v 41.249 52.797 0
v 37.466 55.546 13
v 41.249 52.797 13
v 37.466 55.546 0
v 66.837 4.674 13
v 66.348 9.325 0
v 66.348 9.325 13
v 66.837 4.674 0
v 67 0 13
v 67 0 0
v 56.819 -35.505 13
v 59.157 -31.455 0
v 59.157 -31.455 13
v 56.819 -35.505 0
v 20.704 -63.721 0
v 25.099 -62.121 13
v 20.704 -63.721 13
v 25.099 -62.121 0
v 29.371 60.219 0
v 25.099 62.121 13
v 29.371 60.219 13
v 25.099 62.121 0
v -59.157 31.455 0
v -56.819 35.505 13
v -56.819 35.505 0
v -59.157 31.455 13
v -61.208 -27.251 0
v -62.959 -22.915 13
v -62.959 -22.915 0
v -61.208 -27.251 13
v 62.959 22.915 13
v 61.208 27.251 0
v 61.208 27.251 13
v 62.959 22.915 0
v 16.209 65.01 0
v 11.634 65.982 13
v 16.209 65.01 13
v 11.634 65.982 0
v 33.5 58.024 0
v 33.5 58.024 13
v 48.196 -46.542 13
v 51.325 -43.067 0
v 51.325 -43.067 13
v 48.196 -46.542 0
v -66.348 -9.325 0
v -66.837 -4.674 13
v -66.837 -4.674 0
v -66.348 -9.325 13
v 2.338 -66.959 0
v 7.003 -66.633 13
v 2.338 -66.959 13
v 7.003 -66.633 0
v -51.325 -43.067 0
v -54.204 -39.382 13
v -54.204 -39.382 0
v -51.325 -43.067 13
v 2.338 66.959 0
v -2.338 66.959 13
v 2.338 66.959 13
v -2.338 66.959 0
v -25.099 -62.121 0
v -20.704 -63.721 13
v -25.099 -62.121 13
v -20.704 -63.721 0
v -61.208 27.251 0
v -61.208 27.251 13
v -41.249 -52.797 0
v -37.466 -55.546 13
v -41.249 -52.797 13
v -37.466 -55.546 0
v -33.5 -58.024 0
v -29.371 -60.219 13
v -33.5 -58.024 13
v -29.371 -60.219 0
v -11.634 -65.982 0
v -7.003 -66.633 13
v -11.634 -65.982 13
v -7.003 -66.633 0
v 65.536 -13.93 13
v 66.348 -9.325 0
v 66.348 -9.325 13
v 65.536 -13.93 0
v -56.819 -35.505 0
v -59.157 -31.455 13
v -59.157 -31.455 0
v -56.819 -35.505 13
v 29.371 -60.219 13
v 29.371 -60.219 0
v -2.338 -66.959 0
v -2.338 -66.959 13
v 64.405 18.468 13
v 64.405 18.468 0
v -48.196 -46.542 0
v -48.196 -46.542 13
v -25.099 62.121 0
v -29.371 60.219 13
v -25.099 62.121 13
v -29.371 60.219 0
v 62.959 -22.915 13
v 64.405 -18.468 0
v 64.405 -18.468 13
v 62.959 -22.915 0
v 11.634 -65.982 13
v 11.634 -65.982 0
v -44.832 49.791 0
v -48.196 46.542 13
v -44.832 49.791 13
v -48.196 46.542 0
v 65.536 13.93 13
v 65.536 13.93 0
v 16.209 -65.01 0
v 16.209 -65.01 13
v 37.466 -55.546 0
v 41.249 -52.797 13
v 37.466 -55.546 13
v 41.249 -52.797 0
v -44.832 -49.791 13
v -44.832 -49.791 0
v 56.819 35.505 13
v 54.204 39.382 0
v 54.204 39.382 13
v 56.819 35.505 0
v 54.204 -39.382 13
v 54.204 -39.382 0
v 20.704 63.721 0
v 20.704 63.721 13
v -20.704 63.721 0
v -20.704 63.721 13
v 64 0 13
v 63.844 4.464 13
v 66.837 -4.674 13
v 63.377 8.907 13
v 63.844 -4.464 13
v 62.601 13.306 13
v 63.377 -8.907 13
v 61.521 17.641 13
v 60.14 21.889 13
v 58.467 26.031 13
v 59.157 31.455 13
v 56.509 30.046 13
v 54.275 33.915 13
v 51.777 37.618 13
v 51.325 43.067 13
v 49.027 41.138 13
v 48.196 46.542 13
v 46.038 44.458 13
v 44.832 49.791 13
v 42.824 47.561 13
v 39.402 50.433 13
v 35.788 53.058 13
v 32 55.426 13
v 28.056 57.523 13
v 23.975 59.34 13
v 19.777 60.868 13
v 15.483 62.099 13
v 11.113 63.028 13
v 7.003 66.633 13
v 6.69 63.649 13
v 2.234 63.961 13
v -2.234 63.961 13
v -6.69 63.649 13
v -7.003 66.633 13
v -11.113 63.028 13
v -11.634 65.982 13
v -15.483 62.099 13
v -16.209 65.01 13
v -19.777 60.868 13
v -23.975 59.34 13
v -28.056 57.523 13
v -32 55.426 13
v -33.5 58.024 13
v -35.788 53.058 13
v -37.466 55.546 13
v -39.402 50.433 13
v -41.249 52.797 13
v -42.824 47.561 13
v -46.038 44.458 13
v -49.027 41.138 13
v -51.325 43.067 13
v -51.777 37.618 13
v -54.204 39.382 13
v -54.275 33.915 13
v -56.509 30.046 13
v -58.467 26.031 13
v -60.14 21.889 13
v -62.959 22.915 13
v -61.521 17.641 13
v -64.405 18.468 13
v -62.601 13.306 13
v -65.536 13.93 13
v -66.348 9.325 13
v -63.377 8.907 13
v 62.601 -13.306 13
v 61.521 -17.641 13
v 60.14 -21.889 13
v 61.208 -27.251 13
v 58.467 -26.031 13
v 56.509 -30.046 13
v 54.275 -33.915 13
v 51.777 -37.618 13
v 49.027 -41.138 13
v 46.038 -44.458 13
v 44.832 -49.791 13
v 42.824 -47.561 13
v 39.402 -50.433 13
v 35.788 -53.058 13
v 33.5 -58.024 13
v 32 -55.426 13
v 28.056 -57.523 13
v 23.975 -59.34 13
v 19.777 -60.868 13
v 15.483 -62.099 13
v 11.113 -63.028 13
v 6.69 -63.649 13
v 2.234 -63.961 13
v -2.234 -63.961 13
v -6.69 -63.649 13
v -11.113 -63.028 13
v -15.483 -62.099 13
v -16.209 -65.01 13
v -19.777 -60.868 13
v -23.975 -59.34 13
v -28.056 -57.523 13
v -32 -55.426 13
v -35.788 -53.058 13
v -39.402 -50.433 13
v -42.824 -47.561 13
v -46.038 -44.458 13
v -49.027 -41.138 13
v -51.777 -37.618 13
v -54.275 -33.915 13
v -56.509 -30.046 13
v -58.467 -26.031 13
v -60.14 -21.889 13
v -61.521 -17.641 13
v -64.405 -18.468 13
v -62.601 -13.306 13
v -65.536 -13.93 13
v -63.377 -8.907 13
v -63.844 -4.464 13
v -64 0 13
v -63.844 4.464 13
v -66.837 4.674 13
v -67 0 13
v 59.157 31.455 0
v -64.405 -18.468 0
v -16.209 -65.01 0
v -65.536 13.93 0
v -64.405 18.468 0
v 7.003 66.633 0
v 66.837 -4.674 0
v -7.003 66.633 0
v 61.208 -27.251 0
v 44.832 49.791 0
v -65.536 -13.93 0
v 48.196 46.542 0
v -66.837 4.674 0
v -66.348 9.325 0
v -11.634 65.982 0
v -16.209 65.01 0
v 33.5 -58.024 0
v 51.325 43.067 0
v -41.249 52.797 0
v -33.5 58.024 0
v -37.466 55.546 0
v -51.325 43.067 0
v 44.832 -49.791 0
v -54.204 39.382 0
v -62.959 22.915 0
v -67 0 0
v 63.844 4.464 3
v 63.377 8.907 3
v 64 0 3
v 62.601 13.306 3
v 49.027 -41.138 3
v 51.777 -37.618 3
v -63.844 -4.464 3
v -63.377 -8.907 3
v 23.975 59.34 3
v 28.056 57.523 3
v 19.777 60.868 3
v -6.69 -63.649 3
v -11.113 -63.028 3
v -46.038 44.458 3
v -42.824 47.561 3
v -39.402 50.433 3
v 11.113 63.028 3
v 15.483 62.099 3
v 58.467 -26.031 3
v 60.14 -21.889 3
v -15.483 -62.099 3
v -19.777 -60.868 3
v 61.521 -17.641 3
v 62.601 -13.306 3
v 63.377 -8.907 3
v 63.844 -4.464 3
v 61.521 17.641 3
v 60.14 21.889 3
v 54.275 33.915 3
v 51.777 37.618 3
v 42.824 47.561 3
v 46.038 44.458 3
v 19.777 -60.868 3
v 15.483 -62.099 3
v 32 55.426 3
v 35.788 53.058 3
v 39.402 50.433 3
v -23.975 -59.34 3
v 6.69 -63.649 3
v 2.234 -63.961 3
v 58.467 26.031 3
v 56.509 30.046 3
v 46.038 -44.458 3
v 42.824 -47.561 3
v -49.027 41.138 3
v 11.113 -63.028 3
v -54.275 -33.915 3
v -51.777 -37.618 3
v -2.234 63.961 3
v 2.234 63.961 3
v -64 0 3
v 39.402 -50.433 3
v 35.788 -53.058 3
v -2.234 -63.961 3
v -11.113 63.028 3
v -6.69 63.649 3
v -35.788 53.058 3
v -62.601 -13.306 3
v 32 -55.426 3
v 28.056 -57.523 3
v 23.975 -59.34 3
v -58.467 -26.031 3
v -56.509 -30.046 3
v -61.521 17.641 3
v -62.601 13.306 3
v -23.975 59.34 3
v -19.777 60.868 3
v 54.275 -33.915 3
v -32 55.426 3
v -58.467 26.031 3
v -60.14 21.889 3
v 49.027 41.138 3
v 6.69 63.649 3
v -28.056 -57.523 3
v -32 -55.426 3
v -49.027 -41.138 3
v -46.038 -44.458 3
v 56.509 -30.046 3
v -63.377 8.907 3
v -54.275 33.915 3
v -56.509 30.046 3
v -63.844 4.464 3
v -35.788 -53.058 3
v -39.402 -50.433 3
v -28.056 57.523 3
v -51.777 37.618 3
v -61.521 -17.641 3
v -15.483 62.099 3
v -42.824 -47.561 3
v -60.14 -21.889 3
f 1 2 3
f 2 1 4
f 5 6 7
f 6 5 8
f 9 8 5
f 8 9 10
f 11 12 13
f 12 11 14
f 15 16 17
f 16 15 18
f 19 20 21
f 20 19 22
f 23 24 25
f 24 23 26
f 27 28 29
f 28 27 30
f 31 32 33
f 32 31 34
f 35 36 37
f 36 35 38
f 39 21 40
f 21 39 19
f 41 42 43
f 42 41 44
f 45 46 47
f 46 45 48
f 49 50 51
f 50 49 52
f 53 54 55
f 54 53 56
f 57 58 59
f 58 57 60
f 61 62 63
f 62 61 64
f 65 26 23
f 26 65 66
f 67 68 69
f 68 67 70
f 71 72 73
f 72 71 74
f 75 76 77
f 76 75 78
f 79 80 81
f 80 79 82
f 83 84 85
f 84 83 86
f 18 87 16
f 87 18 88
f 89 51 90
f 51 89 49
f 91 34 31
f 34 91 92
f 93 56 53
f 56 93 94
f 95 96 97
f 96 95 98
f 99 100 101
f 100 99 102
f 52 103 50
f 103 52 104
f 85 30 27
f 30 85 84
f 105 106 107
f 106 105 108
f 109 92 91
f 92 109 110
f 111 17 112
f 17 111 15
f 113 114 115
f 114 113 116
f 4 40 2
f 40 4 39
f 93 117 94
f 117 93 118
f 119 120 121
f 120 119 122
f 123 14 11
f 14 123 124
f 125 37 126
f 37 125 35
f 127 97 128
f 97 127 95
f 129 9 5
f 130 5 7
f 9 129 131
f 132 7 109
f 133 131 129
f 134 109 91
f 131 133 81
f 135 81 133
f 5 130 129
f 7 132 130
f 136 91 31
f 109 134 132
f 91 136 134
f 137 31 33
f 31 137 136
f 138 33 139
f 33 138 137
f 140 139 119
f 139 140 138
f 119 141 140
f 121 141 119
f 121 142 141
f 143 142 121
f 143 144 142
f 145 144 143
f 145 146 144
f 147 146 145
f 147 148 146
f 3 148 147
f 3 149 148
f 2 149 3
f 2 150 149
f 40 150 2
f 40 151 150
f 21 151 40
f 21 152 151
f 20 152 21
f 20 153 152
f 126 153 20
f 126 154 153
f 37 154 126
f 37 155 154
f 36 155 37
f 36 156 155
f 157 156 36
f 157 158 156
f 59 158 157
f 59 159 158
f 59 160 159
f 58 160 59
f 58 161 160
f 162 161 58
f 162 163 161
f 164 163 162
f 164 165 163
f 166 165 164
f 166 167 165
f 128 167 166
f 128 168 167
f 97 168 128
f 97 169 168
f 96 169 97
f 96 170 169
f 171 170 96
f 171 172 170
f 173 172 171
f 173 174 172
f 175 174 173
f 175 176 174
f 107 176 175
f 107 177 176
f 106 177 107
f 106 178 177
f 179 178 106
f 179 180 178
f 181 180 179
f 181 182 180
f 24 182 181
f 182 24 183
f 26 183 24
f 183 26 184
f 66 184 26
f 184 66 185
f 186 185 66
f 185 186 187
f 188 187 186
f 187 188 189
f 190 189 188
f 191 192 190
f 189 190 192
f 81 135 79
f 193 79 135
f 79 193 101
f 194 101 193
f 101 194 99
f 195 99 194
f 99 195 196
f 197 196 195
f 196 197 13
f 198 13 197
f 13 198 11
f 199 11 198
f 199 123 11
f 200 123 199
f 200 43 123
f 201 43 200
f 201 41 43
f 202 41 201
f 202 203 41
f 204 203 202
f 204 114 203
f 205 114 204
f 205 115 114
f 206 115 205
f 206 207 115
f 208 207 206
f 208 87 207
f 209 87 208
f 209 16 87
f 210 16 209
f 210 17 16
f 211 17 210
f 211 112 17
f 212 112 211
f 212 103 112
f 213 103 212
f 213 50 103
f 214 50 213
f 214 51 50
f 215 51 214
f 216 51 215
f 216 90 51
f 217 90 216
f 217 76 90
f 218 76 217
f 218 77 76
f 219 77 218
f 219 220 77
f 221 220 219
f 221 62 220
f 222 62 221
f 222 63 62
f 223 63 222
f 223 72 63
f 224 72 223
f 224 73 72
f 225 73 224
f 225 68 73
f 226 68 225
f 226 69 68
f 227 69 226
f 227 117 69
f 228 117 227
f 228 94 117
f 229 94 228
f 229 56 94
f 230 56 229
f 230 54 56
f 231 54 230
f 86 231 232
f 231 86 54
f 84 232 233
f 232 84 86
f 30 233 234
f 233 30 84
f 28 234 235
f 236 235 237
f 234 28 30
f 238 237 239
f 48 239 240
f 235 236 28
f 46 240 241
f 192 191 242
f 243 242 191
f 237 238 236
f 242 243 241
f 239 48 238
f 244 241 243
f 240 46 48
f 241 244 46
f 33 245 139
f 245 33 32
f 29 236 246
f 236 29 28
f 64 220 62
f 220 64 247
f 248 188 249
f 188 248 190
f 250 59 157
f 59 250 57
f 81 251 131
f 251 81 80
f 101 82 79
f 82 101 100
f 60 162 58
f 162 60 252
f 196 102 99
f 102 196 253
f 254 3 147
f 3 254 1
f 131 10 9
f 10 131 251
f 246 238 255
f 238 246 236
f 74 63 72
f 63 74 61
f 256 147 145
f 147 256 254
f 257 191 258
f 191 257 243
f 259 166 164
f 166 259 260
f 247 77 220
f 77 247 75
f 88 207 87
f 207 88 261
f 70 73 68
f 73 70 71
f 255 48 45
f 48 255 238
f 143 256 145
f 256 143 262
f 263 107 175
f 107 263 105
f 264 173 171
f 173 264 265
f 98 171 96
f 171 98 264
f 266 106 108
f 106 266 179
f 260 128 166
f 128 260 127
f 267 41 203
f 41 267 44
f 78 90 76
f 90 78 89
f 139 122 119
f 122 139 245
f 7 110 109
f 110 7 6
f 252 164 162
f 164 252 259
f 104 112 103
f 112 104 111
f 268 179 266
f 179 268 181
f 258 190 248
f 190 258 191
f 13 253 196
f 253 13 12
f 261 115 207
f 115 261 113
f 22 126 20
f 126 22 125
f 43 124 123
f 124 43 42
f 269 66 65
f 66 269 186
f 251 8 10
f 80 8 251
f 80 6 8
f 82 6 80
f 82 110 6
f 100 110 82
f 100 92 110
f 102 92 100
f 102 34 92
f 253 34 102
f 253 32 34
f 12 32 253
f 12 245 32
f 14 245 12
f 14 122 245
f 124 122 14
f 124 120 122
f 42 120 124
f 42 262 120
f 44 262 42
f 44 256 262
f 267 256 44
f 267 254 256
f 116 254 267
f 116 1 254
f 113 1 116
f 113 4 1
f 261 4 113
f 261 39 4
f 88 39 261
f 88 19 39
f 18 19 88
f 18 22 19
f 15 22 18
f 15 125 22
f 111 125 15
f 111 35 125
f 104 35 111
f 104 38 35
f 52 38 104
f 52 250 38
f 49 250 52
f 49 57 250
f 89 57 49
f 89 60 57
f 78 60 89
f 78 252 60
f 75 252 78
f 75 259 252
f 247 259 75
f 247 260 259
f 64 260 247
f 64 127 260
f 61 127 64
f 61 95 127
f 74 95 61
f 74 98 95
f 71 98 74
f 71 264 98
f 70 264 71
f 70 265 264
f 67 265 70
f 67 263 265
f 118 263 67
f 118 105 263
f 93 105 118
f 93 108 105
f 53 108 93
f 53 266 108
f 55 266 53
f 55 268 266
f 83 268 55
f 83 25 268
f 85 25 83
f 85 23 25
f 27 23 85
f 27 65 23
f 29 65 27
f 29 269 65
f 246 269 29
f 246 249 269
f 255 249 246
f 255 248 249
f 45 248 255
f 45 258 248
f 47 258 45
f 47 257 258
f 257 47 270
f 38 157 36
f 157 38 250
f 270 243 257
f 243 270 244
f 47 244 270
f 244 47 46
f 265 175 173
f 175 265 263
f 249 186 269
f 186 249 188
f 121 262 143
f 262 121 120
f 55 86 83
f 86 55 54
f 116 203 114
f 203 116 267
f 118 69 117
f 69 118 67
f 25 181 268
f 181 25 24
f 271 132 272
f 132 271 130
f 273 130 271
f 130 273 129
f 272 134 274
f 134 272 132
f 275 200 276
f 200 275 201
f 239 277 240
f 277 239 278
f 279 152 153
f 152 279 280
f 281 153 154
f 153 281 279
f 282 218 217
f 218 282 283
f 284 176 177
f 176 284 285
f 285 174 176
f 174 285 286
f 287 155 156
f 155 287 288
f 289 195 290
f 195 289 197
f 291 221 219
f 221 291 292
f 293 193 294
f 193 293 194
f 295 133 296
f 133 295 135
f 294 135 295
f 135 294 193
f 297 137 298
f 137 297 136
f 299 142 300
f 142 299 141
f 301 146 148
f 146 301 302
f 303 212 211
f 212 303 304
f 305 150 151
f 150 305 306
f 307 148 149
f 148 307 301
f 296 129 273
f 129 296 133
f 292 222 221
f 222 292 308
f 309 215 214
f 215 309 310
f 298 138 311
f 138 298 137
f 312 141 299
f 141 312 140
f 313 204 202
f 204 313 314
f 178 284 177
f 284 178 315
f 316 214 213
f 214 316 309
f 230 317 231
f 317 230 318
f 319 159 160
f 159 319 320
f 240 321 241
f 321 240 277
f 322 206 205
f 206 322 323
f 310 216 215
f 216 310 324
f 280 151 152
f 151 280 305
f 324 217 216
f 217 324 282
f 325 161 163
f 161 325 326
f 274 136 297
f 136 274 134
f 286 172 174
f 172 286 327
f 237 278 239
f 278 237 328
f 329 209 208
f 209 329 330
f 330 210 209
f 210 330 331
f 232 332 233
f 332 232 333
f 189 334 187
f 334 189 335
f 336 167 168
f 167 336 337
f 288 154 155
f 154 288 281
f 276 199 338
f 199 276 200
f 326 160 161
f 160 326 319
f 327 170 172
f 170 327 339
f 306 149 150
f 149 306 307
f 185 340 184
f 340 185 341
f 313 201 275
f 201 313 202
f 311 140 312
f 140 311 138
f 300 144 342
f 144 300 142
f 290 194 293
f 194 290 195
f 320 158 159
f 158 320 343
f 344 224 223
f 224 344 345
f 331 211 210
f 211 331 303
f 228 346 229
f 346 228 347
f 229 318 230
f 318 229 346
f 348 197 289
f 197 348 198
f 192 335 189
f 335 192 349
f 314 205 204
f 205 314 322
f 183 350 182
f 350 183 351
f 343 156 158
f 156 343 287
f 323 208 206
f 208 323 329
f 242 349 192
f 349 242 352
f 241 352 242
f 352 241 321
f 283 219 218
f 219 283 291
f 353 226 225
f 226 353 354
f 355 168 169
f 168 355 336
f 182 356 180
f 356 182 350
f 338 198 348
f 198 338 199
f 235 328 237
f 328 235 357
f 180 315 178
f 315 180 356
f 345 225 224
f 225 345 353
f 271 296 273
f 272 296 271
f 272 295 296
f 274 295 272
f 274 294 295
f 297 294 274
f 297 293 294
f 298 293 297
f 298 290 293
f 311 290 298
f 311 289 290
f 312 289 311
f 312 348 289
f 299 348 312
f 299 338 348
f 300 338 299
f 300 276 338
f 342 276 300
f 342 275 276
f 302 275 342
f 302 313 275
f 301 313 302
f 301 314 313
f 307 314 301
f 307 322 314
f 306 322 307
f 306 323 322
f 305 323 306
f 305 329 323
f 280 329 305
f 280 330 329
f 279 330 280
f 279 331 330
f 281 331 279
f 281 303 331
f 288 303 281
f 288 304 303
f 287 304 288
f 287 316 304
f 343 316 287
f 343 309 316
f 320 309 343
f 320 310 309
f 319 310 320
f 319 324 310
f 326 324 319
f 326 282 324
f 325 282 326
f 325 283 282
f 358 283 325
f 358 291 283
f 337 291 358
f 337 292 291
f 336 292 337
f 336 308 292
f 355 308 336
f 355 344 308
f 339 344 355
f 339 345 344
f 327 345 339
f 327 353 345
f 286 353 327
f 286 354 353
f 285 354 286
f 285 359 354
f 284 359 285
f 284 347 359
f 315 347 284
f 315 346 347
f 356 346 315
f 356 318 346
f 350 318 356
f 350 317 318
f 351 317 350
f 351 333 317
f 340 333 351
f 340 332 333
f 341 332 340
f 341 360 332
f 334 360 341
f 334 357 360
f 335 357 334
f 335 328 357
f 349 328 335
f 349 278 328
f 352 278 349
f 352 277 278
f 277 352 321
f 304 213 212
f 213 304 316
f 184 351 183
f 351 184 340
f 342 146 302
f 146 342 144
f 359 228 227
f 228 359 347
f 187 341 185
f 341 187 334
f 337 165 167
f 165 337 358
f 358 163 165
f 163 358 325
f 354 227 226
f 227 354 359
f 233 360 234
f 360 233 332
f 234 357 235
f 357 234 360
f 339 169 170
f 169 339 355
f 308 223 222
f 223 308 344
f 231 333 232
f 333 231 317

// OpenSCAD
// Copyright 2022 by Excretia of Unconscious Processes, LLC



/*Set up some variables  */

$fa=4;      // minimum fragment angle (low number=high quality, def=12)
diam=128;   // diameter of the screen
dep=10;     // depth of the screen section


module screen_lid () {
    difference() {
        translate([0,0,(dep+3)/2])
            cylinder(h=dep+3, d=diam+6, center=true);
        translate([0,0,(dep)/2+3])
            cylinder(h=dep, d=diam, center=true);
    }
}


screen_lid();
